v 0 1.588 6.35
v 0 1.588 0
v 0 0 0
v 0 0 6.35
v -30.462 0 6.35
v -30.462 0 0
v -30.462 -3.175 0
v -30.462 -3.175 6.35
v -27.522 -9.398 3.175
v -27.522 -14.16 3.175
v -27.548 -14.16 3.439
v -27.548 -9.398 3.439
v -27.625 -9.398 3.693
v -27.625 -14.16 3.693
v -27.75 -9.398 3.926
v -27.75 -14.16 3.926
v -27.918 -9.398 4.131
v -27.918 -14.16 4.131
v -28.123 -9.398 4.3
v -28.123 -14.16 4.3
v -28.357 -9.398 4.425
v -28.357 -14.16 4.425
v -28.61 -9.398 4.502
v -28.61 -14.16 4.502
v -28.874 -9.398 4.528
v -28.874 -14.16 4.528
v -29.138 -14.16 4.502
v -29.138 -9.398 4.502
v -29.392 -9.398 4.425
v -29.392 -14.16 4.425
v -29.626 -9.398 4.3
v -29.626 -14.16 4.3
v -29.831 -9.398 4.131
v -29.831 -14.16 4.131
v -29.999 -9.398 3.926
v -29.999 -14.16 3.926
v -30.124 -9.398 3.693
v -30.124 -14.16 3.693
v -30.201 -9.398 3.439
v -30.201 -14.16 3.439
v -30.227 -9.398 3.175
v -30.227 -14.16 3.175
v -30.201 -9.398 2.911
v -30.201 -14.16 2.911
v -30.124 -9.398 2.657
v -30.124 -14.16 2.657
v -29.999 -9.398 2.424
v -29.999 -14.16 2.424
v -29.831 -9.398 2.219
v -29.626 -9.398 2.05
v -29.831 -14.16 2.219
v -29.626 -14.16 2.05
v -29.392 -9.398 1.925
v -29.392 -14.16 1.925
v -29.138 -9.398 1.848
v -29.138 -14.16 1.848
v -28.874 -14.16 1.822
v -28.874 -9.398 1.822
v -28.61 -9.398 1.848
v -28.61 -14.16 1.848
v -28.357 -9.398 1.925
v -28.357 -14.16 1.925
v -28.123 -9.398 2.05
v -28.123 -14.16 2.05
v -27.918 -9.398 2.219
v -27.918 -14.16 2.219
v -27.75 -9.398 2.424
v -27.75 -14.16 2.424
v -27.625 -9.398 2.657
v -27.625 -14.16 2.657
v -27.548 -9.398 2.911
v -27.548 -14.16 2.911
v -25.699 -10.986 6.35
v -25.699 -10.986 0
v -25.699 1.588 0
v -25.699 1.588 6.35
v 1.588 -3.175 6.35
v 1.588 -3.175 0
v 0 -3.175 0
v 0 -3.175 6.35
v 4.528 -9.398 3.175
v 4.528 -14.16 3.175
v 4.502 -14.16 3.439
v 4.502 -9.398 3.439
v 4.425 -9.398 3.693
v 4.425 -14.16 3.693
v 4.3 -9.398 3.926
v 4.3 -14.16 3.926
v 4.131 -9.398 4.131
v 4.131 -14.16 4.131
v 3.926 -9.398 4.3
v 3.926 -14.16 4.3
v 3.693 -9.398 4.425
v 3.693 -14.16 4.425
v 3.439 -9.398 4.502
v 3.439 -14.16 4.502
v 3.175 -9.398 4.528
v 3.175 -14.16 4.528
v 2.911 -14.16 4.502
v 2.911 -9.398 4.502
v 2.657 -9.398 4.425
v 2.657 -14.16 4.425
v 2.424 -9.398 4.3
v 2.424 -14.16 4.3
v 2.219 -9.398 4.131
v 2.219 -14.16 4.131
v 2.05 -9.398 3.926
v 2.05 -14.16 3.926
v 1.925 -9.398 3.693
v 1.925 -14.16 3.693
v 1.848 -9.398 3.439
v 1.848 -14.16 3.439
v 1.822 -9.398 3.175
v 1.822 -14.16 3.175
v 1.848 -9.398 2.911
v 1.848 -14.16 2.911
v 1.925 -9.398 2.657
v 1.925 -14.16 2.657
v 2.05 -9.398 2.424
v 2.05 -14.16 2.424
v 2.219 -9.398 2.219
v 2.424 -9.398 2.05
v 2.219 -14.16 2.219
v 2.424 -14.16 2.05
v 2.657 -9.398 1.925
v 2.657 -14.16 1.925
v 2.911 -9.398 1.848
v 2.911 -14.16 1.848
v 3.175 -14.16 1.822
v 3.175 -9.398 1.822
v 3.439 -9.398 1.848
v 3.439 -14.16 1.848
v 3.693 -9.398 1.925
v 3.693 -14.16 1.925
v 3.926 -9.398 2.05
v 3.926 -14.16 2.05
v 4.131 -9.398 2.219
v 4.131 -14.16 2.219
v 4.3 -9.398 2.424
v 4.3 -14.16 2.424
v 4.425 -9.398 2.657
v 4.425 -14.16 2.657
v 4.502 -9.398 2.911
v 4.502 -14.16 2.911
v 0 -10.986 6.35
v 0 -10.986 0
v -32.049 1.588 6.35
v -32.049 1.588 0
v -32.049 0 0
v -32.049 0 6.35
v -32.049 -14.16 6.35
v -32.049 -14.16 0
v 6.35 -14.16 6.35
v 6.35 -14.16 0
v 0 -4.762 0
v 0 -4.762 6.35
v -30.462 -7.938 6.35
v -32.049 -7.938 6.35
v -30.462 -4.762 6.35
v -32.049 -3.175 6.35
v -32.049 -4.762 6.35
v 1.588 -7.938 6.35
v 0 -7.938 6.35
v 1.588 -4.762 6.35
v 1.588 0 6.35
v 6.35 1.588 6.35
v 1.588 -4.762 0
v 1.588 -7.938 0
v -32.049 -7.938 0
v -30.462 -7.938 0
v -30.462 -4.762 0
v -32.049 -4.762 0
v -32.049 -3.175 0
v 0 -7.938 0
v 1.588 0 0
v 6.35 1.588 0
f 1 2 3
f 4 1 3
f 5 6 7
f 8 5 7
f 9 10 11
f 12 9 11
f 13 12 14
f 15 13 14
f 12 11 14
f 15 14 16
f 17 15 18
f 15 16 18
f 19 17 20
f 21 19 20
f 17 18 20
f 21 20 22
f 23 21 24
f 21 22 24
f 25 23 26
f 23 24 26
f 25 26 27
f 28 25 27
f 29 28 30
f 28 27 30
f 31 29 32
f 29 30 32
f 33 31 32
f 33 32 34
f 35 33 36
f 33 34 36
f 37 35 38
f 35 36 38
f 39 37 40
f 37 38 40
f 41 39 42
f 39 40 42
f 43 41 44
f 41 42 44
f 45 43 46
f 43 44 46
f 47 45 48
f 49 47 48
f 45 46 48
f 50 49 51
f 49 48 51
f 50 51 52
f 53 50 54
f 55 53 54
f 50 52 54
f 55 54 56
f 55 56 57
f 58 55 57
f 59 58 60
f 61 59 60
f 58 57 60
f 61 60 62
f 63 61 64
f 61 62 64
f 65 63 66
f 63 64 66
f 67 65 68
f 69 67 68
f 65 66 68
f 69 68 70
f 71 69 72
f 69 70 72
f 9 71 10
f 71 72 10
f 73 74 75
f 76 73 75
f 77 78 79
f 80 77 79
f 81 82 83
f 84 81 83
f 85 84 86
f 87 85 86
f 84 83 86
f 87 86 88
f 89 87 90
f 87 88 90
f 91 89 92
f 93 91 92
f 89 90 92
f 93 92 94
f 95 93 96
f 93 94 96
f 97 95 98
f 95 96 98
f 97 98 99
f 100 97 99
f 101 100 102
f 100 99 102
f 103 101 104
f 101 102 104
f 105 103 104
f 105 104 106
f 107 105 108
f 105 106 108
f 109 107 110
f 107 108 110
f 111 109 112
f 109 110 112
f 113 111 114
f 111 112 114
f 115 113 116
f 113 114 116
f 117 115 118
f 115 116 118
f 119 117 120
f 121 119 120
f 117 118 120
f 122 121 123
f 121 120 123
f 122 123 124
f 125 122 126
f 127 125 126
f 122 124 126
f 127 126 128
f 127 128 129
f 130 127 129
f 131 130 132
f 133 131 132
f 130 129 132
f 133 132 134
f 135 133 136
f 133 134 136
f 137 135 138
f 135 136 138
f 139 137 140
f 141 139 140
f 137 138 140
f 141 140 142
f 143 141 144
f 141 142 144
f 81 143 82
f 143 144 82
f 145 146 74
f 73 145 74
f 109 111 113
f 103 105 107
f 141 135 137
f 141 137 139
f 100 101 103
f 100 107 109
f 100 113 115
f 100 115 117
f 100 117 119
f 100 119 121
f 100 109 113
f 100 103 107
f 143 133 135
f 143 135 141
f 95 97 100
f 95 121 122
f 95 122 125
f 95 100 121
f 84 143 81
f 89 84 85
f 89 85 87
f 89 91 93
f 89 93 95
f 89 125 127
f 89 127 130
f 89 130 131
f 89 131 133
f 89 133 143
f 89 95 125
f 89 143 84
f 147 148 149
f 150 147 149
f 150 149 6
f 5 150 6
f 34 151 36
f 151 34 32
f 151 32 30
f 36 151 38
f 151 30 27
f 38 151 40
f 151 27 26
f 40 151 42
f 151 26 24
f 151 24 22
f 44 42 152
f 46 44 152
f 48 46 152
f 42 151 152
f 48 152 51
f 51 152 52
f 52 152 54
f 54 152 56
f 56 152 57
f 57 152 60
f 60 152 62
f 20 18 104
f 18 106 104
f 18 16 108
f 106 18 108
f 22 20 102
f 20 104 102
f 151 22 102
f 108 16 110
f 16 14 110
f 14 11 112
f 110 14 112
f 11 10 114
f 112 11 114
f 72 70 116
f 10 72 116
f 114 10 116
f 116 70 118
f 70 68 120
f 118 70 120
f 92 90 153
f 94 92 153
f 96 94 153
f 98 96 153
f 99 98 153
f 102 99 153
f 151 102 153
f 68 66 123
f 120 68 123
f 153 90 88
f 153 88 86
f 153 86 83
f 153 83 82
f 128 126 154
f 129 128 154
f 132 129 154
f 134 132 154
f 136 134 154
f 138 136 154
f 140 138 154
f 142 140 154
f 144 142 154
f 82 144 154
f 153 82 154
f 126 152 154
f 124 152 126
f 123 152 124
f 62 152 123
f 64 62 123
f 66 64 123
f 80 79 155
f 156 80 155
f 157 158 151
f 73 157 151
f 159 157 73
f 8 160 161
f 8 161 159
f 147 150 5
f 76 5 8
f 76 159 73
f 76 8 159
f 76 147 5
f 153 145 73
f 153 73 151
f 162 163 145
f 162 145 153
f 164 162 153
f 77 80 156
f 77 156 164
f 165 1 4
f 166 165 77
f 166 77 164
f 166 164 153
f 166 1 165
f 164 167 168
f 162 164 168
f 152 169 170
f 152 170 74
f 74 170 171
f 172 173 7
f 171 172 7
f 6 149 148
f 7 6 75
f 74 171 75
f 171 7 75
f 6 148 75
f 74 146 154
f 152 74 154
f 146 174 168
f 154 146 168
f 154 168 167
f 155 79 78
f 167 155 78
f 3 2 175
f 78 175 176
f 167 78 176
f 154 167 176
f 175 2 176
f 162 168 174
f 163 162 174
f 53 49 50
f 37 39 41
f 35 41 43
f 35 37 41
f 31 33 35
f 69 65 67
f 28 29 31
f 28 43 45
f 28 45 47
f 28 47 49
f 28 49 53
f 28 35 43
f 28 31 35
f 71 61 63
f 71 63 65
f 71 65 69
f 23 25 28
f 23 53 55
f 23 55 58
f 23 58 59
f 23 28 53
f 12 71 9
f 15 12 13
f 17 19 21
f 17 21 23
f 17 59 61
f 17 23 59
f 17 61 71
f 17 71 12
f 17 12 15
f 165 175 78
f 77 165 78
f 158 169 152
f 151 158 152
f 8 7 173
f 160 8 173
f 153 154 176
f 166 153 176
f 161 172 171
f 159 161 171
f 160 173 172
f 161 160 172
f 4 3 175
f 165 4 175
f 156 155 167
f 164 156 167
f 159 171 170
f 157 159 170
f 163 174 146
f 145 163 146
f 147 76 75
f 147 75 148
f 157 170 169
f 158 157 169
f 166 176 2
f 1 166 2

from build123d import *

# Parameters (mm, degrees)
F1_DEPTH = 6.35
F2_R     = 1.35255
F3_DEPTH = 4.7625


with BuildPart() as f1:
    # F0 (on Top) → F1 (new body)
    with BuildSketch(Plane.XY):
        Polygon((0, 1.5875), (0, 0), (1.5875, 0), (1.5875, -3.175), (0, -3.175), (0, -4.7625), (1.5875, -4.7625), (1.5875, -7.9375), (0, -7.9375), (0, -10.9855), (-25.69911, -10.9855), (-25.69911, 1.5875), (-32.04911, 1.5875), (-32.04911, 0), (-30.46161, 0), (-30.46161, -3.175), (-32.04911, -3.175), (-32.04911, -4.7625), (-30.46161, -4.7625), (-30.46161, -7.9375), (-32.04911, -7.9375), (-32.04911, -14.1605), (6.35, -14.1605), (6.35, 1.5875), align=None)
    extrude(amount=F1_DEPTH)

    # F2 (on face) → F3 (cut)
    with BuildSketch(Plane.XZ.offset(14.1605)):
        with Locations((-28.87411, 3.175)):
            Circle(F2_R)
        with Locations((3.175, 3.175)):
            Circle(F2_R)
    extrude(amount=-F3_DEPTH, mode=Mode.SUBTRACT)


solid = f1.part
